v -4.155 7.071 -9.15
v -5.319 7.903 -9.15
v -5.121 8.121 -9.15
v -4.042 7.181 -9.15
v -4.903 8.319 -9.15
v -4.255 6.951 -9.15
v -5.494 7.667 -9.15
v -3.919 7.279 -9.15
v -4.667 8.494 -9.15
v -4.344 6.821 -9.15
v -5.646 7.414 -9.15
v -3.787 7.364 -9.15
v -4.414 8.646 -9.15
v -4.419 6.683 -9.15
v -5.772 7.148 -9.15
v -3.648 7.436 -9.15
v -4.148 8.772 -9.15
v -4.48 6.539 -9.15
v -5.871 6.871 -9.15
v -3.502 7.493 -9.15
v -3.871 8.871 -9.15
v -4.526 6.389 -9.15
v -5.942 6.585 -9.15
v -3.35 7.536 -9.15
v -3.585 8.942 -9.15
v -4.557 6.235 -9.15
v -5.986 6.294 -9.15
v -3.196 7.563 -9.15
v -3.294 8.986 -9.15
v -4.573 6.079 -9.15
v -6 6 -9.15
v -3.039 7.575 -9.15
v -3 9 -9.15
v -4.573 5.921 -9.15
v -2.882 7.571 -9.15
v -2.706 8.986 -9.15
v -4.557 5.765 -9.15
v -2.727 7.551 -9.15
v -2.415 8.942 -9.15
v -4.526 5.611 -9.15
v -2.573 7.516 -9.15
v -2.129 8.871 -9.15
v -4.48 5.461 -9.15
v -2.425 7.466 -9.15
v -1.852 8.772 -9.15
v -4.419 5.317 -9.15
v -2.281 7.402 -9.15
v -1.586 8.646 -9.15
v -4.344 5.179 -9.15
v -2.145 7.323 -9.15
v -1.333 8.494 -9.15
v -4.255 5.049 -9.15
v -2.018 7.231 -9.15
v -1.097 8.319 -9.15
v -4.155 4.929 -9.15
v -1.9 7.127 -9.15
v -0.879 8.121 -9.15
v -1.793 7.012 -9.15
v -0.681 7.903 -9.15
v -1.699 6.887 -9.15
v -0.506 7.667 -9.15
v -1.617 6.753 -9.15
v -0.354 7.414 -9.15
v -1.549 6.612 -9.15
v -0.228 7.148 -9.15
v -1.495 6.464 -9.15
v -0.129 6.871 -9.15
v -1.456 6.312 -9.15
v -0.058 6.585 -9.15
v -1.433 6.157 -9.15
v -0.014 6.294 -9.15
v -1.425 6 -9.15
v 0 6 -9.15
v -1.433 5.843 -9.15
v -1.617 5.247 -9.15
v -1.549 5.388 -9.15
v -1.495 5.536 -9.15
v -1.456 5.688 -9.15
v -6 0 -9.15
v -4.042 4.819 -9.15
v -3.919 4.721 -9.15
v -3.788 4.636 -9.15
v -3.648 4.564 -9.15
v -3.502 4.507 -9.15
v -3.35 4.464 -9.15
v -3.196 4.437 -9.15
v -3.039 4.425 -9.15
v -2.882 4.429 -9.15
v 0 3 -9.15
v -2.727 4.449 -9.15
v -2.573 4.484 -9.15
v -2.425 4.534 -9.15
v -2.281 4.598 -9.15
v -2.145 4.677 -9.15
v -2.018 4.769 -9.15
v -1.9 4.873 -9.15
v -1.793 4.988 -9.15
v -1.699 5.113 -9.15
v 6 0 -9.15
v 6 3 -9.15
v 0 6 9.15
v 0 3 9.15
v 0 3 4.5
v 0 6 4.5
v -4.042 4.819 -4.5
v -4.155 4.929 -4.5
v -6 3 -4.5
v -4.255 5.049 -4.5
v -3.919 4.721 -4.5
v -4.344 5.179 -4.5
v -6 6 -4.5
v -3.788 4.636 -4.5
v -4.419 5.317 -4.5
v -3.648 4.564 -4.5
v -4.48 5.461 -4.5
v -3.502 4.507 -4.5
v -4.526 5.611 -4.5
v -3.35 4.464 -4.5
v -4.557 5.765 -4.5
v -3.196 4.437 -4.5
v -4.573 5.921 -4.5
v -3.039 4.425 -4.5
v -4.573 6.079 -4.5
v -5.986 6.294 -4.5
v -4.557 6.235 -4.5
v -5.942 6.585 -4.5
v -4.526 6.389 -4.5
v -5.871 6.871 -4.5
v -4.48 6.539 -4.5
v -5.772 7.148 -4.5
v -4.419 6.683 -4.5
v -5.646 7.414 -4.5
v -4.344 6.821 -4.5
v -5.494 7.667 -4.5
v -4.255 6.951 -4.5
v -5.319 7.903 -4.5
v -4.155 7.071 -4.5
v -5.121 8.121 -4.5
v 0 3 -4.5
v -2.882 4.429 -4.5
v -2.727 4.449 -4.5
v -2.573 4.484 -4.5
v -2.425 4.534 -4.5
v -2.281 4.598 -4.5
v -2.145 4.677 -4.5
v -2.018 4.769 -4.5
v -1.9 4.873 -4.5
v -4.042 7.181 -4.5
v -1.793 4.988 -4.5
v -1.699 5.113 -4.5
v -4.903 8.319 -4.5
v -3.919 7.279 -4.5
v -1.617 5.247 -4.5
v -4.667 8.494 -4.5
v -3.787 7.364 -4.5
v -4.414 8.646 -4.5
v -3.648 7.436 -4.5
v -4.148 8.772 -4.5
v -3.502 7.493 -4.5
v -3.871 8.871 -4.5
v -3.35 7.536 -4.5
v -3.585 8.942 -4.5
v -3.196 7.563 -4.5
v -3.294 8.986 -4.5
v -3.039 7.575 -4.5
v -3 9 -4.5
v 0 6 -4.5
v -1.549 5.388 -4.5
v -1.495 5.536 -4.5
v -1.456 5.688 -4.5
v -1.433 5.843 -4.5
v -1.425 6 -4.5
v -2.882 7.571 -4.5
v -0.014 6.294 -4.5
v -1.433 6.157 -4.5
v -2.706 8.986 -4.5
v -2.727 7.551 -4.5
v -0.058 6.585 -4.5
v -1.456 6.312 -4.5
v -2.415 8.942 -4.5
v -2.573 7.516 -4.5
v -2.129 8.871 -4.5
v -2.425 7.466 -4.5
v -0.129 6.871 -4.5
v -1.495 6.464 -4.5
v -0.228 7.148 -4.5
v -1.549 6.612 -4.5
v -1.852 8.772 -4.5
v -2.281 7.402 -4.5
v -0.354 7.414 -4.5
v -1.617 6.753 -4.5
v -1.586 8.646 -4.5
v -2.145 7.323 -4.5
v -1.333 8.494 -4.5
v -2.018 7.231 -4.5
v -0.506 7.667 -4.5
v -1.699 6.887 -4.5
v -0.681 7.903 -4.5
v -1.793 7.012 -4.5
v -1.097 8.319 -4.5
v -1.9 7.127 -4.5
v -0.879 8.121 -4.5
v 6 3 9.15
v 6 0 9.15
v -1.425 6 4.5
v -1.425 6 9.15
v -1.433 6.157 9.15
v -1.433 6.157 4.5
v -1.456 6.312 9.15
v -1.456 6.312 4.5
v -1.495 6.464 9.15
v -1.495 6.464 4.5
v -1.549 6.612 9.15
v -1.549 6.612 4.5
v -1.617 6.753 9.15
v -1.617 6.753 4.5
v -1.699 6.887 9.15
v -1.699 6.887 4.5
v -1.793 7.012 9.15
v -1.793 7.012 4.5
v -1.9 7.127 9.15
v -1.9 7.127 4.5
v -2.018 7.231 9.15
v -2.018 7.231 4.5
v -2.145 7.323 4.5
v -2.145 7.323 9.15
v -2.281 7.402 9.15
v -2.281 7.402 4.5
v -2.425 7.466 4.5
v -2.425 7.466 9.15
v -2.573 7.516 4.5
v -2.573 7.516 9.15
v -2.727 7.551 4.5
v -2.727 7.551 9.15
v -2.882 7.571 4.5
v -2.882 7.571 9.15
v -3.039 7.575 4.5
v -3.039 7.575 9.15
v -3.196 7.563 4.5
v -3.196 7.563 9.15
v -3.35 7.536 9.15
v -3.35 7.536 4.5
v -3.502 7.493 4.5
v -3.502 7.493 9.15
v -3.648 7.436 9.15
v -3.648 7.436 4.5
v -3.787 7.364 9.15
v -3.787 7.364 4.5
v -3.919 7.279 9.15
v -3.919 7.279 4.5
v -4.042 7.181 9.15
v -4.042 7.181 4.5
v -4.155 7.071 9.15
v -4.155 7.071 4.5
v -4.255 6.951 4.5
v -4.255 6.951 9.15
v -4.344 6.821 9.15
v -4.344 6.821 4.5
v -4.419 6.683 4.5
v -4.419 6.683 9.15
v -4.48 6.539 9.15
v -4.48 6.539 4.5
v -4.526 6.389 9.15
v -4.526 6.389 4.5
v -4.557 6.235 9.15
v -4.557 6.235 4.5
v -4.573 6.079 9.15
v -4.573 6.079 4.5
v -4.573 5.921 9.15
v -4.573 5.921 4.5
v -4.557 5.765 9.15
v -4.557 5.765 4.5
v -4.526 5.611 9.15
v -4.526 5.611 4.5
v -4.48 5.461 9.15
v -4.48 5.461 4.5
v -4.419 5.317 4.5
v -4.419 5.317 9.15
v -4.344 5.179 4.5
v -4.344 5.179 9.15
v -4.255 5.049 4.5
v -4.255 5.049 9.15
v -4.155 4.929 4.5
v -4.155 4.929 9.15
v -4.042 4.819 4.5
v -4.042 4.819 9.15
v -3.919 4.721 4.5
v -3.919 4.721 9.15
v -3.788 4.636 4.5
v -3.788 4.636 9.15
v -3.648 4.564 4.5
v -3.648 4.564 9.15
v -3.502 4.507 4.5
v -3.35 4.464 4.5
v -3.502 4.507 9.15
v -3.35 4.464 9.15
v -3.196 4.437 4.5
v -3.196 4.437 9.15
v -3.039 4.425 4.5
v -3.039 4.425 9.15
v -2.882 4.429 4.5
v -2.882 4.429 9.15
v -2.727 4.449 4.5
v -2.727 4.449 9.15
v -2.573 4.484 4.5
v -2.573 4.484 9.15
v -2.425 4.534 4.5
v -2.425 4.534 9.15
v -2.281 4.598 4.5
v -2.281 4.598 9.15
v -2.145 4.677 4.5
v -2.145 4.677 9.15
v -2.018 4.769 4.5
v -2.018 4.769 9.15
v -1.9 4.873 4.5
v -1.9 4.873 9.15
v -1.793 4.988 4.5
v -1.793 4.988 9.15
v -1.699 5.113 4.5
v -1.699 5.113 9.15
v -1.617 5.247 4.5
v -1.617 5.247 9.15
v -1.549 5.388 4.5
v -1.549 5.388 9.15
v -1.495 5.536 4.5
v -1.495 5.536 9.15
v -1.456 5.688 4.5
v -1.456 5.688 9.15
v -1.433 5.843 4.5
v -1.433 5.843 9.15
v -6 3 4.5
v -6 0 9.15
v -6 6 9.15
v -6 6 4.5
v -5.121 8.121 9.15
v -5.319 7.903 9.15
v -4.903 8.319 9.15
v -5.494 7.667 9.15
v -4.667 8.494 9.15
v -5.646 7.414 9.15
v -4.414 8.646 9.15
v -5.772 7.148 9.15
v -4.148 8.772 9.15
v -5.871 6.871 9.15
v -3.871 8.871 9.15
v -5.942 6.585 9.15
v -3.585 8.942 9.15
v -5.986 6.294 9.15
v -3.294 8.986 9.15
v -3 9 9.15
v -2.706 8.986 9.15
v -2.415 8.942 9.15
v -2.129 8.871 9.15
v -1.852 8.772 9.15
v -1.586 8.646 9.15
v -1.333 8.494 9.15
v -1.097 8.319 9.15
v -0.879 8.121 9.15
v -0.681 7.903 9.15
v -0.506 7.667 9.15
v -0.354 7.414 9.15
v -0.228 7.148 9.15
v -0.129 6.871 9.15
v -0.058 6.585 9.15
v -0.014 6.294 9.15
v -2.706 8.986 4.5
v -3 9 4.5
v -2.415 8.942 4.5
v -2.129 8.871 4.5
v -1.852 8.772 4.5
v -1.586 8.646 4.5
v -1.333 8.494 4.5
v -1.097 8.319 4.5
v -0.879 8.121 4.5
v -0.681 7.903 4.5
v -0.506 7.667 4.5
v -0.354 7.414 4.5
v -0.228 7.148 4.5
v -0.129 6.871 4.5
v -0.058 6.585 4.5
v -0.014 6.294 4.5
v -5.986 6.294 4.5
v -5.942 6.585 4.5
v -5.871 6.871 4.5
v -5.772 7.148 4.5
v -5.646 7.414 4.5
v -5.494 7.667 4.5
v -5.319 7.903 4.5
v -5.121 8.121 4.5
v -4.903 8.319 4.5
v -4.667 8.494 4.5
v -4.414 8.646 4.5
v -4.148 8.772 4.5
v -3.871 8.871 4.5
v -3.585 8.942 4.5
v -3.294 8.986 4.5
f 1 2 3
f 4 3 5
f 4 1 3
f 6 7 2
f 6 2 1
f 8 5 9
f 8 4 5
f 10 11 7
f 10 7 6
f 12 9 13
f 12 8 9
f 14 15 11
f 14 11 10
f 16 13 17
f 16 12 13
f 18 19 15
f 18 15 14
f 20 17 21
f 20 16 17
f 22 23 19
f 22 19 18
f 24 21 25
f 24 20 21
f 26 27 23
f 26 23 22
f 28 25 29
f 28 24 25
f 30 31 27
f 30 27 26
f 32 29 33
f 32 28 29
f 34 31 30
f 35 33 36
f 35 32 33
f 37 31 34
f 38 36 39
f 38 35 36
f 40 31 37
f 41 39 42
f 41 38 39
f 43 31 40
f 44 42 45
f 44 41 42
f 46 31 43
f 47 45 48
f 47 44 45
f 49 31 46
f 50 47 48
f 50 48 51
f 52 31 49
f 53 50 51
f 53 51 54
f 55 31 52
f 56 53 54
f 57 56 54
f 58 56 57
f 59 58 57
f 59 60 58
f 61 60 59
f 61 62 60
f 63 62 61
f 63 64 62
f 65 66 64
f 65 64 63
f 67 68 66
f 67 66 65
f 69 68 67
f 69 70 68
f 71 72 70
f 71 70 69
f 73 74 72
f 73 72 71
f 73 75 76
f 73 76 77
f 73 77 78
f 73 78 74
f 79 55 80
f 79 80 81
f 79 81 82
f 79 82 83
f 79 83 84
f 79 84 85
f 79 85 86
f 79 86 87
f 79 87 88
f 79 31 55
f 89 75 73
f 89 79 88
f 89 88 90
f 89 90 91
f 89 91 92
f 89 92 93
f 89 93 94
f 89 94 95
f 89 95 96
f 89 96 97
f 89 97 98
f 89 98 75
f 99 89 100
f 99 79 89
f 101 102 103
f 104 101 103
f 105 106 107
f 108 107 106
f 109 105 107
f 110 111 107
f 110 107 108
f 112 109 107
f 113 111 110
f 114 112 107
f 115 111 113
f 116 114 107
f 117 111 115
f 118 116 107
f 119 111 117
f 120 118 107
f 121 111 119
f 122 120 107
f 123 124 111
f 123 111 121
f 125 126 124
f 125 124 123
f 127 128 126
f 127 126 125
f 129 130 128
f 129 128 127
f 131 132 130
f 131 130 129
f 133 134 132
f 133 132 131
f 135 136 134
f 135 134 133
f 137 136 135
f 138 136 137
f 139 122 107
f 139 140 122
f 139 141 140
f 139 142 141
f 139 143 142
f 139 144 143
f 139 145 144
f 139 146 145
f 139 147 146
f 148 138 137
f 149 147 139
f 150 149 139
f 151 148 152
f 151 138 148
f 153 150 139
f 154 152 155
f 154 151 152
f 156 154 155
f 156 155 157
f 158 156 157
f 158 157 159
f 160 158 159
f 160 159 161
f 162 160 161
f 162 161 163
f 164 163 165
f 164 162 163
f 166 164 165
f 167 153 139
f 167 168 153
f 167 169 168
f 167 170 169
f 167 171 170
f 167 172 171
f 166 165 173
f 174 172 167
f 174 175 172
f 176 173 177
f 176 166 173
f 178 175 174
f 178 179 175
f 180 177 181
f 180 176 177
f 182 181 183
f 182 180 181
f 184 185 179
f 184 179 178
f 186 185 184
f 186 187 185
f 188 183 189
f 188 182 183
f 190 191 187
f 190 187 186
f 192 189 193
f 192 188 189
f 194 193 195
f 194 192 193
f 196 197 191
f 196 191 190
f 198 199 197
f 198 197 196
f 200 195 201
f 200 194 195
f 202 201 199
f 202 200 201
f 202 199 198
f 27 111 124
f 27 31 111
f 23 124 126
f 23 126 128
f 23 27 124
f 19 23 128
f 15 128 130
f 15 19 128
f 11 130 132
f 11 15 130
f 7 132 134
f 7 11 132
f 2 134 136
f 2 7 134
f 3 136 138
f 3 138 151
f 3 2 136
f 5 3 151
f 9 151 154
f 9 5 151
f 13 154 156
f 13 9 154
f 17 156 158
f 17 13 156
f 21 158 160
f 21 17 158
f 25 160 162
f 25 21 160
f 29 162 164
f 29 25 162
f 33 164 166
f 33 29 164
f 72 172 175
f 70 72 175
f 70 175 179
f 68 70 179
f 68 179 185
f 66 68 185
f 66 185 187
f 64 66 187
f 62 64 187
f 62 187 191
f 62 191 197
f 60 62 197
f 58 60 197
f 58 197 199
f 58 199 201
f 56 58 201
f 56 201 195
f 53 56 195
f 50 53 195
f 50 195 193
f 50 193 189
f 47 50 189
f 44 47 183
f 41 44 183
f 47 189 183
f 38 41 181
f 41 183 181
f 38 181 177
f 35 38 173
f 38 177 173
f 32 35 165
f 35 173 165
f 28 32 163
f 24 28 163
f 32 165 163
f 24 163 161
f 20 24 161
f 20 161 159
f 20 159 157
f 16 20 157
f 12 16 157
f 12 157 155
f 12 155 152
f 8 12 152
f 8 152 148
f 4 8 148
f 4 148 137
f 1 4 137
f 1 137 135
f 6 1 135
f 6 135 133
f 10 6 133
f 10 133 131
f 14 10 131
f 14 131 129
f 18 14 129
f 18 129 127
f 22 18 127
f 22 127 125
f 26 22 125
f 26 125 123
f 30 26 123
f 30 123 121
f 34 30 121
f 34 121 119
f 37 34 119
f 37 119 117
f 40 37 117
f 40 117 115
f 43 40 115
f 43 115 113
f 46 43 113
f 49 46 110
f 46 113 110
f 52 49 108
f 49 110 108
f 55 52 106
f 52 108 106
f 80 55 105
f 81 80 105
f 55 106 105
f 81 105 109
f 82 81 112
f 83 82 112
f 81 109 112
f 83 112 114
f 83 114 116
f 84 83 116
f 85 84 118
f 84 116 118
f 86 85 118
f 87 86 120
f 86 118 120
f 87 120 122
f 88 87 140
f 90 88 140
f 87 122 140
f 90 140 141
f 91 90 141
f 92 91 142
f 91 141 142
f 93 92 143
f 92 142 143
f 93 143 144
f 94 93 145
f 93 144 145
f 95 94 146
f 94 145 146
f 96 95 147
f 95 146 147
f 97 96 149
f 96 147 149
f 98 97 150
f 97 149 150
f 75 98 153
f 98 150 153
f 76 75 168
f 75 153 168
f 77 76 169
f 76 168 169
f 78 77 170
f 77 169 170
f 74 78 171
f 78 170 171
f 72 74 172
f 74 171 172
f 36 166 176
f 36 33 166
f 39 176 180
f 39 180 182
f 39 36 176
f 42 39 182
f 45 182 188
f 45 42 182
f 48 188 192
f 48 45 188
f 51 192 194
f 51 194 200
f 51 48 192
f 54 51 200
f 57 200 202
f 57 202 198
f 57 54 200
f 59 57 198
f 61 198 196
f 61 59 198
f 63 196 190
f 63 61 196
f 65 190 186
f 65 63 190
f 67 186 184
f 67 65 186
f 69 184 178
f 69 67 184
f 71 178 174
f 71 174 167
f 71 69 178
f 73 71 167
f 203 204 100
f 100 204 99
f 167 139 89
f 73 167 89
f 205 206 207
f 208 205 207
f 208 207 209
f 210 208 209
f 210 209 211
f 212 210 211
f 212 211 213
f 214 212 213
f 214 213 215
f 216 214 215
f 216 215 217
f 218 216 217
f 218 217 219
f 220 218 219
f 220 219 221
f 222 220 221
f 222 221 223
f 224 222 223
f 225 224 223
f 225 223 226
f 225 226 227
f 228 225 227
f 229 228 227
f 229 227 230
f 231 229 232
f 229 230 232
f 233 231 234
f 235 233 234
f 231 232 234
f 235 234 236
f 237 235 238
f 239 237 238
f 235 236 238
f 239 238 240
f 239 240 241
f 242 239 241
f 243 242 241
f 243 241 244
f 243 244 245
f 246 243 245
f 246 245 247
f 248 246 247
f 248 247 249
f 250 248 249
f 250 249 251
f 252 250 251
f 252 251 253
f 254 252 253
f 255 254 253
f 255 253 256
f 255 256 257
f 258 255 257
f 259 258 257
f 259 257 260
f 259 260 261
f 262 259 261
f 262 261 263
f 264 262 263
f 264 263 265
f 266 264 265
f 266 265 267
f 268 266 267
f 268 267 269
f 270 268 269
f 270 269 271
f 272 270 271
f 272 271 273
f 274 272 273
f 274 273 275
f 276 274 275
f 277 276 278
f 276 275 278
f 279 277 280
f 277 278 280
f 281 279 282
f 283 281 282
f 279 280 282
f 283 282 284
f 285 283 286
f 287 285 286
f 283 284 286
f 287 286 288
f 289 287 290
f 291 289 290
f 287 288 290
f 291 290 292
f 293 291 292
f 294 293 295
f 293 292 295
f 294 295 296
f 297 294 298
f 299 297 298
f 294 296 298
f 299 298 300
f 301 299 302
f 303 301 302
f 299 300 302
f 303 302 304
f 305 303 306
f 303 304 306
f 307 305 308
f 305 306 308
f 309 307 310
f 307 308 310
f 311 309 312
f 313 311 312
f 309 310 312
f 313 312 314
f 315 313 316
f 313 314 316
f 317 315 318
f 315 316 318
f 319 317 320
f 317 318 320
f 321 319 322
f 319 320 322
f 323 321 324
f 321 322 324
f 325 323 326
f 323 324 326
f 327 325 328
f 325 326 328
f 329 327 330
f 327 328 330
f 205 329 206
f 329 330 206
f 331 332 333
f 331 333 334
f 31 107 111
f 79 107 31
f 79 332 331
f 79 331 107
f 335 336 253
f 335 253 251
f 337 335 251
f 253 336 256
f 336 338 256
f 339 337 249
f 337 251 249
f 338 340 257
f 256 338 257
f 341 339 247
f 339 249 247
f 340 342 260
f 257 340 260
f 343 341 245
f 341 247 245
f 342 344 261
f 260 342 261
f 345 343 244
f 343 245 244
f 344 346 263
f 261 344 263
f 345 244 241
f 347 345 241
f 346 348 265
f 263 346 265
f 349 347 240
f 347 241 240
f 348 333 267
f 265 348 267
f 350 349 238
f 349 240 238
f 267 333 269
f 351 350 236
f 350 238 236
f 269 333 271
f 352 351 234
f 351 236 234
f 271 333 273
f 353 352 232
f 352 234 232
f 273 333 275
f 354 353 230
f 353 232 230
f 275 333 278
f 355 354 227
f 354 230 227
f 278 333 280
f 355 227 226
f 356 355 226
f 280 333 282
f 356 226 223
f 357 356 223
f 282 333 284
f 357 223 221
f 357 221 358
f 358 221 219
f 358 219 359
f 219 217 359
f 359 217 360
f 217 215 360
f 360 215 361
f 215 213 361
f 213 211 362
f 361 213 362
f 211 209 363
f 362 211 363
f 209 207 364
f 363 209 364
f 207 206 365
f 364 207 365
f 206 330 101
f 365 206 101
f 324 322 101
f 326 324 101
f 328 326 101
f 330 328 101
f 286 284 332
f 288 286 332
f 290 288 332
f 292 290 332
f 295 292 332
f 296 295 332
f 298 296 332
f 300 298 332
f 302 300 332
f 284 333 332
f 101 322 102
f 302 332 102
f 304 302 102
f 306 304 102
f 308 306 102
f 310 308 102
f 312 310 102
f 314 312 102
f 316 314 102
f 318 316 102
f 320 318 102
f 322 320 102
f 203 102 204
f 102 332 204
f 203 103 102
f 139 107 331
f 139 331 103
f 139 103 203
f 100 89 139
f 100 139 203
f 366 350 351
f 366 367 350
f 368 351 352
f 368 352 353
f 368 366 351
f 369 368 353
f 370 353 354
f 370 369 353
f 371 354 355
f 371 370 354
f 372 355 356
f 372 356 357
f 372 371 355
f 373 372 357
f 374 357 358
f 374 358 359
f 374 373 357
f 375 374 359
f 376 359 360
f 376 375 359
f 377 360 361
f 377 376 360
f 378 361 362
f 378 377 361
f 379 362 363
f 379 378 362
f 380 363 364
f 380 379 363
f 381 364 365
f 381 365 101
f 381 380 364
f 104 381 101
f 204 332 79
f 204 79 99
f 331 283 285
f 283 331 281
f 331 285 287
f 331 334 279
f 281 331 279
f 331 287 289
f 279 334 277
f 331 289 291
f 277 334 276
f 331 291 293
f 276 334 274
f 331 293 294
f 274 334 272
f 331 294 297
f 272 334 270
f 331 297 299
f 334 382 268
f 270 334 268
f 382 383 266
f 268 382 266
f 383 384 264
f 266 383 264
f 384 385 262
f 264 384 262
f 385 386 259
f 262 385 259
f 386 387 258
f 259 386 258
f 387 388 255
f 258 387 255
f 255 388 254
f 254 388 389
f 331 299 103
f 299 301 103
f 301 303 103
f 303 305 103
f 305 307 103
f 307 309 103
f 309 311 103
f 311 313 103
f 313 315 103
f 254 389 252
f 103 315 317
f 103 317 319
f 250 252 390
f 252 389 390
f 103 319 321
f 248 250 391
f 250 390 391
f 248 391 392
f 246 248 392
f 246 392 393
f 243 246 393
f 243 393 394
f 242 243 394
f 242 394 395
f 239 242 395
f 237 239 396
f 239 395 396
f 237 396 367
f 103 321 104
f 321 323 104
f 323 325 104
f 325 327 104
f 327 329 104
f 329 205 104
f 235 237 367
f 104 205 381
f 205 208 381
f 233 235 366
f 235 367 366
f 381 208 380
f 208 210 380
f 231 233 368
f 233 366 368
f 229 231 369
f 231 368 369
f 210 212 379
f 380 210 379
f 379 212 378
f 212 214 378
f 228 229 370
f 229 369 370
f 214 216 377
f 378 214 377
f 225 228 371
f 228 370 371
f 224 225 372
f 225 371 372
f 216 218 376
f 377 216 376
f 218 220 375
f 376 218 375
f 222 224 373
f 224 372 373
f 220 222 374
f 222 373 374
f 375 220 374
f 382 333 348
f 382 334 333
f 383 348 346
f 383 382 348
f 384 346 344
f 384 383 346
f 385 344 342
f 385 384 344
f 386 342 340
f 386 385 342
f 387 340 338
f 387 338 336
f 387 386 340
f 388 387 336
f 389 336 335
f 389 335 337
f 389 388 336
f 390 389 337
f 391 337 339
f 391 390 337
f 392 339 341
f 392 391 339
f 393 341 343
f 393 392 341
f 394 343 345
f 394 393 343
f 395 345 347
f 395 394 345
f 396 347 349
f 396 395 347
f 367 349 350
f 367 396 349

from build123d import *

# Parameters (mm, degrees)
SKETCH1_W           = 12
SKETCH1_H           = 18.3
BOSS_EXTRUDE1_DEPTH = 3
SKETCH2_W           = 6
SKETCH2_H           = 18.3
BOSS_EXTRUDE2_DEPTH = 6
SKETCH3_R           = 1.575
CUT_EXTRUDE1_DEPTH  = 22.257704486
SKETCH4_W           = 6
SKETCH4_H           = 9
CUT_EXTRUDE2_DEPTH  = 6
FILLET1_R           = 3


with BuildPart() as part:
    # Sketch1 → Boss-Extrude1 (new body)
    with BuildSketch(Plane(origin=(0, 0, 0), x_dir=(1, 0, 0), z_dir=(0, 1, 0))):
        Rectangle(SKETCH1_W, SKETCH1_H)
    extrude(amount=BOSS_EXTRUDE1_DEPTH)

    # Sketch2 → Boss-Extrude2 (add)
    with BuildSketch(Plane(origin=(0, 3, 0), x_dir=(1, 0, 0), z_dir=(0, 1, 0))):
        with Locations((-3, 0)):
            Rectangle(SKETCH2_W, SKETCH2_H)
    extrude(amount=BOSS_EXTRUDE2_DEPTH)

    # Sketch3 → Cut-Extrude1 (cut, through all)
    with BuildSketch(Plane.XY.offset(9.15)):
        with Locations((-3, 6)):
            Circle(SKETCH3_R)
    extrude(amount=-CUT_EXTRUDE1_DEPTH, mode=Mode.SUBTRACT)

    # Sketch4 → Cut-Extrude2 (cut)
    with BuildSketch(Plane(origin=(0, 9, 0), x_dir=(1, 0, 0), z_dir=(0, 1, 0))):
        with Locations((-3, 0)):
            Rectangle(SKETCH4_W, SKETCH4_H)
    extrude(amount=-CUT_EXTRUDE2_DEPTH, mode=Mode.SUBTRACT)

    # Fillet1
    fillet1_edges = [part.edges().sort_by_distance(p)[0] for p in [
        (-6, 9, 6.825),
        (0, 9, 6.825),
        (-6, 9, -6.825),
        (0, 9, -6.825),
    ]]
    fillet(fillet1_edges, radius=FILLET1_R - 0.0001)  # a hair under: the kernel refuses the full size


solid = part.part
